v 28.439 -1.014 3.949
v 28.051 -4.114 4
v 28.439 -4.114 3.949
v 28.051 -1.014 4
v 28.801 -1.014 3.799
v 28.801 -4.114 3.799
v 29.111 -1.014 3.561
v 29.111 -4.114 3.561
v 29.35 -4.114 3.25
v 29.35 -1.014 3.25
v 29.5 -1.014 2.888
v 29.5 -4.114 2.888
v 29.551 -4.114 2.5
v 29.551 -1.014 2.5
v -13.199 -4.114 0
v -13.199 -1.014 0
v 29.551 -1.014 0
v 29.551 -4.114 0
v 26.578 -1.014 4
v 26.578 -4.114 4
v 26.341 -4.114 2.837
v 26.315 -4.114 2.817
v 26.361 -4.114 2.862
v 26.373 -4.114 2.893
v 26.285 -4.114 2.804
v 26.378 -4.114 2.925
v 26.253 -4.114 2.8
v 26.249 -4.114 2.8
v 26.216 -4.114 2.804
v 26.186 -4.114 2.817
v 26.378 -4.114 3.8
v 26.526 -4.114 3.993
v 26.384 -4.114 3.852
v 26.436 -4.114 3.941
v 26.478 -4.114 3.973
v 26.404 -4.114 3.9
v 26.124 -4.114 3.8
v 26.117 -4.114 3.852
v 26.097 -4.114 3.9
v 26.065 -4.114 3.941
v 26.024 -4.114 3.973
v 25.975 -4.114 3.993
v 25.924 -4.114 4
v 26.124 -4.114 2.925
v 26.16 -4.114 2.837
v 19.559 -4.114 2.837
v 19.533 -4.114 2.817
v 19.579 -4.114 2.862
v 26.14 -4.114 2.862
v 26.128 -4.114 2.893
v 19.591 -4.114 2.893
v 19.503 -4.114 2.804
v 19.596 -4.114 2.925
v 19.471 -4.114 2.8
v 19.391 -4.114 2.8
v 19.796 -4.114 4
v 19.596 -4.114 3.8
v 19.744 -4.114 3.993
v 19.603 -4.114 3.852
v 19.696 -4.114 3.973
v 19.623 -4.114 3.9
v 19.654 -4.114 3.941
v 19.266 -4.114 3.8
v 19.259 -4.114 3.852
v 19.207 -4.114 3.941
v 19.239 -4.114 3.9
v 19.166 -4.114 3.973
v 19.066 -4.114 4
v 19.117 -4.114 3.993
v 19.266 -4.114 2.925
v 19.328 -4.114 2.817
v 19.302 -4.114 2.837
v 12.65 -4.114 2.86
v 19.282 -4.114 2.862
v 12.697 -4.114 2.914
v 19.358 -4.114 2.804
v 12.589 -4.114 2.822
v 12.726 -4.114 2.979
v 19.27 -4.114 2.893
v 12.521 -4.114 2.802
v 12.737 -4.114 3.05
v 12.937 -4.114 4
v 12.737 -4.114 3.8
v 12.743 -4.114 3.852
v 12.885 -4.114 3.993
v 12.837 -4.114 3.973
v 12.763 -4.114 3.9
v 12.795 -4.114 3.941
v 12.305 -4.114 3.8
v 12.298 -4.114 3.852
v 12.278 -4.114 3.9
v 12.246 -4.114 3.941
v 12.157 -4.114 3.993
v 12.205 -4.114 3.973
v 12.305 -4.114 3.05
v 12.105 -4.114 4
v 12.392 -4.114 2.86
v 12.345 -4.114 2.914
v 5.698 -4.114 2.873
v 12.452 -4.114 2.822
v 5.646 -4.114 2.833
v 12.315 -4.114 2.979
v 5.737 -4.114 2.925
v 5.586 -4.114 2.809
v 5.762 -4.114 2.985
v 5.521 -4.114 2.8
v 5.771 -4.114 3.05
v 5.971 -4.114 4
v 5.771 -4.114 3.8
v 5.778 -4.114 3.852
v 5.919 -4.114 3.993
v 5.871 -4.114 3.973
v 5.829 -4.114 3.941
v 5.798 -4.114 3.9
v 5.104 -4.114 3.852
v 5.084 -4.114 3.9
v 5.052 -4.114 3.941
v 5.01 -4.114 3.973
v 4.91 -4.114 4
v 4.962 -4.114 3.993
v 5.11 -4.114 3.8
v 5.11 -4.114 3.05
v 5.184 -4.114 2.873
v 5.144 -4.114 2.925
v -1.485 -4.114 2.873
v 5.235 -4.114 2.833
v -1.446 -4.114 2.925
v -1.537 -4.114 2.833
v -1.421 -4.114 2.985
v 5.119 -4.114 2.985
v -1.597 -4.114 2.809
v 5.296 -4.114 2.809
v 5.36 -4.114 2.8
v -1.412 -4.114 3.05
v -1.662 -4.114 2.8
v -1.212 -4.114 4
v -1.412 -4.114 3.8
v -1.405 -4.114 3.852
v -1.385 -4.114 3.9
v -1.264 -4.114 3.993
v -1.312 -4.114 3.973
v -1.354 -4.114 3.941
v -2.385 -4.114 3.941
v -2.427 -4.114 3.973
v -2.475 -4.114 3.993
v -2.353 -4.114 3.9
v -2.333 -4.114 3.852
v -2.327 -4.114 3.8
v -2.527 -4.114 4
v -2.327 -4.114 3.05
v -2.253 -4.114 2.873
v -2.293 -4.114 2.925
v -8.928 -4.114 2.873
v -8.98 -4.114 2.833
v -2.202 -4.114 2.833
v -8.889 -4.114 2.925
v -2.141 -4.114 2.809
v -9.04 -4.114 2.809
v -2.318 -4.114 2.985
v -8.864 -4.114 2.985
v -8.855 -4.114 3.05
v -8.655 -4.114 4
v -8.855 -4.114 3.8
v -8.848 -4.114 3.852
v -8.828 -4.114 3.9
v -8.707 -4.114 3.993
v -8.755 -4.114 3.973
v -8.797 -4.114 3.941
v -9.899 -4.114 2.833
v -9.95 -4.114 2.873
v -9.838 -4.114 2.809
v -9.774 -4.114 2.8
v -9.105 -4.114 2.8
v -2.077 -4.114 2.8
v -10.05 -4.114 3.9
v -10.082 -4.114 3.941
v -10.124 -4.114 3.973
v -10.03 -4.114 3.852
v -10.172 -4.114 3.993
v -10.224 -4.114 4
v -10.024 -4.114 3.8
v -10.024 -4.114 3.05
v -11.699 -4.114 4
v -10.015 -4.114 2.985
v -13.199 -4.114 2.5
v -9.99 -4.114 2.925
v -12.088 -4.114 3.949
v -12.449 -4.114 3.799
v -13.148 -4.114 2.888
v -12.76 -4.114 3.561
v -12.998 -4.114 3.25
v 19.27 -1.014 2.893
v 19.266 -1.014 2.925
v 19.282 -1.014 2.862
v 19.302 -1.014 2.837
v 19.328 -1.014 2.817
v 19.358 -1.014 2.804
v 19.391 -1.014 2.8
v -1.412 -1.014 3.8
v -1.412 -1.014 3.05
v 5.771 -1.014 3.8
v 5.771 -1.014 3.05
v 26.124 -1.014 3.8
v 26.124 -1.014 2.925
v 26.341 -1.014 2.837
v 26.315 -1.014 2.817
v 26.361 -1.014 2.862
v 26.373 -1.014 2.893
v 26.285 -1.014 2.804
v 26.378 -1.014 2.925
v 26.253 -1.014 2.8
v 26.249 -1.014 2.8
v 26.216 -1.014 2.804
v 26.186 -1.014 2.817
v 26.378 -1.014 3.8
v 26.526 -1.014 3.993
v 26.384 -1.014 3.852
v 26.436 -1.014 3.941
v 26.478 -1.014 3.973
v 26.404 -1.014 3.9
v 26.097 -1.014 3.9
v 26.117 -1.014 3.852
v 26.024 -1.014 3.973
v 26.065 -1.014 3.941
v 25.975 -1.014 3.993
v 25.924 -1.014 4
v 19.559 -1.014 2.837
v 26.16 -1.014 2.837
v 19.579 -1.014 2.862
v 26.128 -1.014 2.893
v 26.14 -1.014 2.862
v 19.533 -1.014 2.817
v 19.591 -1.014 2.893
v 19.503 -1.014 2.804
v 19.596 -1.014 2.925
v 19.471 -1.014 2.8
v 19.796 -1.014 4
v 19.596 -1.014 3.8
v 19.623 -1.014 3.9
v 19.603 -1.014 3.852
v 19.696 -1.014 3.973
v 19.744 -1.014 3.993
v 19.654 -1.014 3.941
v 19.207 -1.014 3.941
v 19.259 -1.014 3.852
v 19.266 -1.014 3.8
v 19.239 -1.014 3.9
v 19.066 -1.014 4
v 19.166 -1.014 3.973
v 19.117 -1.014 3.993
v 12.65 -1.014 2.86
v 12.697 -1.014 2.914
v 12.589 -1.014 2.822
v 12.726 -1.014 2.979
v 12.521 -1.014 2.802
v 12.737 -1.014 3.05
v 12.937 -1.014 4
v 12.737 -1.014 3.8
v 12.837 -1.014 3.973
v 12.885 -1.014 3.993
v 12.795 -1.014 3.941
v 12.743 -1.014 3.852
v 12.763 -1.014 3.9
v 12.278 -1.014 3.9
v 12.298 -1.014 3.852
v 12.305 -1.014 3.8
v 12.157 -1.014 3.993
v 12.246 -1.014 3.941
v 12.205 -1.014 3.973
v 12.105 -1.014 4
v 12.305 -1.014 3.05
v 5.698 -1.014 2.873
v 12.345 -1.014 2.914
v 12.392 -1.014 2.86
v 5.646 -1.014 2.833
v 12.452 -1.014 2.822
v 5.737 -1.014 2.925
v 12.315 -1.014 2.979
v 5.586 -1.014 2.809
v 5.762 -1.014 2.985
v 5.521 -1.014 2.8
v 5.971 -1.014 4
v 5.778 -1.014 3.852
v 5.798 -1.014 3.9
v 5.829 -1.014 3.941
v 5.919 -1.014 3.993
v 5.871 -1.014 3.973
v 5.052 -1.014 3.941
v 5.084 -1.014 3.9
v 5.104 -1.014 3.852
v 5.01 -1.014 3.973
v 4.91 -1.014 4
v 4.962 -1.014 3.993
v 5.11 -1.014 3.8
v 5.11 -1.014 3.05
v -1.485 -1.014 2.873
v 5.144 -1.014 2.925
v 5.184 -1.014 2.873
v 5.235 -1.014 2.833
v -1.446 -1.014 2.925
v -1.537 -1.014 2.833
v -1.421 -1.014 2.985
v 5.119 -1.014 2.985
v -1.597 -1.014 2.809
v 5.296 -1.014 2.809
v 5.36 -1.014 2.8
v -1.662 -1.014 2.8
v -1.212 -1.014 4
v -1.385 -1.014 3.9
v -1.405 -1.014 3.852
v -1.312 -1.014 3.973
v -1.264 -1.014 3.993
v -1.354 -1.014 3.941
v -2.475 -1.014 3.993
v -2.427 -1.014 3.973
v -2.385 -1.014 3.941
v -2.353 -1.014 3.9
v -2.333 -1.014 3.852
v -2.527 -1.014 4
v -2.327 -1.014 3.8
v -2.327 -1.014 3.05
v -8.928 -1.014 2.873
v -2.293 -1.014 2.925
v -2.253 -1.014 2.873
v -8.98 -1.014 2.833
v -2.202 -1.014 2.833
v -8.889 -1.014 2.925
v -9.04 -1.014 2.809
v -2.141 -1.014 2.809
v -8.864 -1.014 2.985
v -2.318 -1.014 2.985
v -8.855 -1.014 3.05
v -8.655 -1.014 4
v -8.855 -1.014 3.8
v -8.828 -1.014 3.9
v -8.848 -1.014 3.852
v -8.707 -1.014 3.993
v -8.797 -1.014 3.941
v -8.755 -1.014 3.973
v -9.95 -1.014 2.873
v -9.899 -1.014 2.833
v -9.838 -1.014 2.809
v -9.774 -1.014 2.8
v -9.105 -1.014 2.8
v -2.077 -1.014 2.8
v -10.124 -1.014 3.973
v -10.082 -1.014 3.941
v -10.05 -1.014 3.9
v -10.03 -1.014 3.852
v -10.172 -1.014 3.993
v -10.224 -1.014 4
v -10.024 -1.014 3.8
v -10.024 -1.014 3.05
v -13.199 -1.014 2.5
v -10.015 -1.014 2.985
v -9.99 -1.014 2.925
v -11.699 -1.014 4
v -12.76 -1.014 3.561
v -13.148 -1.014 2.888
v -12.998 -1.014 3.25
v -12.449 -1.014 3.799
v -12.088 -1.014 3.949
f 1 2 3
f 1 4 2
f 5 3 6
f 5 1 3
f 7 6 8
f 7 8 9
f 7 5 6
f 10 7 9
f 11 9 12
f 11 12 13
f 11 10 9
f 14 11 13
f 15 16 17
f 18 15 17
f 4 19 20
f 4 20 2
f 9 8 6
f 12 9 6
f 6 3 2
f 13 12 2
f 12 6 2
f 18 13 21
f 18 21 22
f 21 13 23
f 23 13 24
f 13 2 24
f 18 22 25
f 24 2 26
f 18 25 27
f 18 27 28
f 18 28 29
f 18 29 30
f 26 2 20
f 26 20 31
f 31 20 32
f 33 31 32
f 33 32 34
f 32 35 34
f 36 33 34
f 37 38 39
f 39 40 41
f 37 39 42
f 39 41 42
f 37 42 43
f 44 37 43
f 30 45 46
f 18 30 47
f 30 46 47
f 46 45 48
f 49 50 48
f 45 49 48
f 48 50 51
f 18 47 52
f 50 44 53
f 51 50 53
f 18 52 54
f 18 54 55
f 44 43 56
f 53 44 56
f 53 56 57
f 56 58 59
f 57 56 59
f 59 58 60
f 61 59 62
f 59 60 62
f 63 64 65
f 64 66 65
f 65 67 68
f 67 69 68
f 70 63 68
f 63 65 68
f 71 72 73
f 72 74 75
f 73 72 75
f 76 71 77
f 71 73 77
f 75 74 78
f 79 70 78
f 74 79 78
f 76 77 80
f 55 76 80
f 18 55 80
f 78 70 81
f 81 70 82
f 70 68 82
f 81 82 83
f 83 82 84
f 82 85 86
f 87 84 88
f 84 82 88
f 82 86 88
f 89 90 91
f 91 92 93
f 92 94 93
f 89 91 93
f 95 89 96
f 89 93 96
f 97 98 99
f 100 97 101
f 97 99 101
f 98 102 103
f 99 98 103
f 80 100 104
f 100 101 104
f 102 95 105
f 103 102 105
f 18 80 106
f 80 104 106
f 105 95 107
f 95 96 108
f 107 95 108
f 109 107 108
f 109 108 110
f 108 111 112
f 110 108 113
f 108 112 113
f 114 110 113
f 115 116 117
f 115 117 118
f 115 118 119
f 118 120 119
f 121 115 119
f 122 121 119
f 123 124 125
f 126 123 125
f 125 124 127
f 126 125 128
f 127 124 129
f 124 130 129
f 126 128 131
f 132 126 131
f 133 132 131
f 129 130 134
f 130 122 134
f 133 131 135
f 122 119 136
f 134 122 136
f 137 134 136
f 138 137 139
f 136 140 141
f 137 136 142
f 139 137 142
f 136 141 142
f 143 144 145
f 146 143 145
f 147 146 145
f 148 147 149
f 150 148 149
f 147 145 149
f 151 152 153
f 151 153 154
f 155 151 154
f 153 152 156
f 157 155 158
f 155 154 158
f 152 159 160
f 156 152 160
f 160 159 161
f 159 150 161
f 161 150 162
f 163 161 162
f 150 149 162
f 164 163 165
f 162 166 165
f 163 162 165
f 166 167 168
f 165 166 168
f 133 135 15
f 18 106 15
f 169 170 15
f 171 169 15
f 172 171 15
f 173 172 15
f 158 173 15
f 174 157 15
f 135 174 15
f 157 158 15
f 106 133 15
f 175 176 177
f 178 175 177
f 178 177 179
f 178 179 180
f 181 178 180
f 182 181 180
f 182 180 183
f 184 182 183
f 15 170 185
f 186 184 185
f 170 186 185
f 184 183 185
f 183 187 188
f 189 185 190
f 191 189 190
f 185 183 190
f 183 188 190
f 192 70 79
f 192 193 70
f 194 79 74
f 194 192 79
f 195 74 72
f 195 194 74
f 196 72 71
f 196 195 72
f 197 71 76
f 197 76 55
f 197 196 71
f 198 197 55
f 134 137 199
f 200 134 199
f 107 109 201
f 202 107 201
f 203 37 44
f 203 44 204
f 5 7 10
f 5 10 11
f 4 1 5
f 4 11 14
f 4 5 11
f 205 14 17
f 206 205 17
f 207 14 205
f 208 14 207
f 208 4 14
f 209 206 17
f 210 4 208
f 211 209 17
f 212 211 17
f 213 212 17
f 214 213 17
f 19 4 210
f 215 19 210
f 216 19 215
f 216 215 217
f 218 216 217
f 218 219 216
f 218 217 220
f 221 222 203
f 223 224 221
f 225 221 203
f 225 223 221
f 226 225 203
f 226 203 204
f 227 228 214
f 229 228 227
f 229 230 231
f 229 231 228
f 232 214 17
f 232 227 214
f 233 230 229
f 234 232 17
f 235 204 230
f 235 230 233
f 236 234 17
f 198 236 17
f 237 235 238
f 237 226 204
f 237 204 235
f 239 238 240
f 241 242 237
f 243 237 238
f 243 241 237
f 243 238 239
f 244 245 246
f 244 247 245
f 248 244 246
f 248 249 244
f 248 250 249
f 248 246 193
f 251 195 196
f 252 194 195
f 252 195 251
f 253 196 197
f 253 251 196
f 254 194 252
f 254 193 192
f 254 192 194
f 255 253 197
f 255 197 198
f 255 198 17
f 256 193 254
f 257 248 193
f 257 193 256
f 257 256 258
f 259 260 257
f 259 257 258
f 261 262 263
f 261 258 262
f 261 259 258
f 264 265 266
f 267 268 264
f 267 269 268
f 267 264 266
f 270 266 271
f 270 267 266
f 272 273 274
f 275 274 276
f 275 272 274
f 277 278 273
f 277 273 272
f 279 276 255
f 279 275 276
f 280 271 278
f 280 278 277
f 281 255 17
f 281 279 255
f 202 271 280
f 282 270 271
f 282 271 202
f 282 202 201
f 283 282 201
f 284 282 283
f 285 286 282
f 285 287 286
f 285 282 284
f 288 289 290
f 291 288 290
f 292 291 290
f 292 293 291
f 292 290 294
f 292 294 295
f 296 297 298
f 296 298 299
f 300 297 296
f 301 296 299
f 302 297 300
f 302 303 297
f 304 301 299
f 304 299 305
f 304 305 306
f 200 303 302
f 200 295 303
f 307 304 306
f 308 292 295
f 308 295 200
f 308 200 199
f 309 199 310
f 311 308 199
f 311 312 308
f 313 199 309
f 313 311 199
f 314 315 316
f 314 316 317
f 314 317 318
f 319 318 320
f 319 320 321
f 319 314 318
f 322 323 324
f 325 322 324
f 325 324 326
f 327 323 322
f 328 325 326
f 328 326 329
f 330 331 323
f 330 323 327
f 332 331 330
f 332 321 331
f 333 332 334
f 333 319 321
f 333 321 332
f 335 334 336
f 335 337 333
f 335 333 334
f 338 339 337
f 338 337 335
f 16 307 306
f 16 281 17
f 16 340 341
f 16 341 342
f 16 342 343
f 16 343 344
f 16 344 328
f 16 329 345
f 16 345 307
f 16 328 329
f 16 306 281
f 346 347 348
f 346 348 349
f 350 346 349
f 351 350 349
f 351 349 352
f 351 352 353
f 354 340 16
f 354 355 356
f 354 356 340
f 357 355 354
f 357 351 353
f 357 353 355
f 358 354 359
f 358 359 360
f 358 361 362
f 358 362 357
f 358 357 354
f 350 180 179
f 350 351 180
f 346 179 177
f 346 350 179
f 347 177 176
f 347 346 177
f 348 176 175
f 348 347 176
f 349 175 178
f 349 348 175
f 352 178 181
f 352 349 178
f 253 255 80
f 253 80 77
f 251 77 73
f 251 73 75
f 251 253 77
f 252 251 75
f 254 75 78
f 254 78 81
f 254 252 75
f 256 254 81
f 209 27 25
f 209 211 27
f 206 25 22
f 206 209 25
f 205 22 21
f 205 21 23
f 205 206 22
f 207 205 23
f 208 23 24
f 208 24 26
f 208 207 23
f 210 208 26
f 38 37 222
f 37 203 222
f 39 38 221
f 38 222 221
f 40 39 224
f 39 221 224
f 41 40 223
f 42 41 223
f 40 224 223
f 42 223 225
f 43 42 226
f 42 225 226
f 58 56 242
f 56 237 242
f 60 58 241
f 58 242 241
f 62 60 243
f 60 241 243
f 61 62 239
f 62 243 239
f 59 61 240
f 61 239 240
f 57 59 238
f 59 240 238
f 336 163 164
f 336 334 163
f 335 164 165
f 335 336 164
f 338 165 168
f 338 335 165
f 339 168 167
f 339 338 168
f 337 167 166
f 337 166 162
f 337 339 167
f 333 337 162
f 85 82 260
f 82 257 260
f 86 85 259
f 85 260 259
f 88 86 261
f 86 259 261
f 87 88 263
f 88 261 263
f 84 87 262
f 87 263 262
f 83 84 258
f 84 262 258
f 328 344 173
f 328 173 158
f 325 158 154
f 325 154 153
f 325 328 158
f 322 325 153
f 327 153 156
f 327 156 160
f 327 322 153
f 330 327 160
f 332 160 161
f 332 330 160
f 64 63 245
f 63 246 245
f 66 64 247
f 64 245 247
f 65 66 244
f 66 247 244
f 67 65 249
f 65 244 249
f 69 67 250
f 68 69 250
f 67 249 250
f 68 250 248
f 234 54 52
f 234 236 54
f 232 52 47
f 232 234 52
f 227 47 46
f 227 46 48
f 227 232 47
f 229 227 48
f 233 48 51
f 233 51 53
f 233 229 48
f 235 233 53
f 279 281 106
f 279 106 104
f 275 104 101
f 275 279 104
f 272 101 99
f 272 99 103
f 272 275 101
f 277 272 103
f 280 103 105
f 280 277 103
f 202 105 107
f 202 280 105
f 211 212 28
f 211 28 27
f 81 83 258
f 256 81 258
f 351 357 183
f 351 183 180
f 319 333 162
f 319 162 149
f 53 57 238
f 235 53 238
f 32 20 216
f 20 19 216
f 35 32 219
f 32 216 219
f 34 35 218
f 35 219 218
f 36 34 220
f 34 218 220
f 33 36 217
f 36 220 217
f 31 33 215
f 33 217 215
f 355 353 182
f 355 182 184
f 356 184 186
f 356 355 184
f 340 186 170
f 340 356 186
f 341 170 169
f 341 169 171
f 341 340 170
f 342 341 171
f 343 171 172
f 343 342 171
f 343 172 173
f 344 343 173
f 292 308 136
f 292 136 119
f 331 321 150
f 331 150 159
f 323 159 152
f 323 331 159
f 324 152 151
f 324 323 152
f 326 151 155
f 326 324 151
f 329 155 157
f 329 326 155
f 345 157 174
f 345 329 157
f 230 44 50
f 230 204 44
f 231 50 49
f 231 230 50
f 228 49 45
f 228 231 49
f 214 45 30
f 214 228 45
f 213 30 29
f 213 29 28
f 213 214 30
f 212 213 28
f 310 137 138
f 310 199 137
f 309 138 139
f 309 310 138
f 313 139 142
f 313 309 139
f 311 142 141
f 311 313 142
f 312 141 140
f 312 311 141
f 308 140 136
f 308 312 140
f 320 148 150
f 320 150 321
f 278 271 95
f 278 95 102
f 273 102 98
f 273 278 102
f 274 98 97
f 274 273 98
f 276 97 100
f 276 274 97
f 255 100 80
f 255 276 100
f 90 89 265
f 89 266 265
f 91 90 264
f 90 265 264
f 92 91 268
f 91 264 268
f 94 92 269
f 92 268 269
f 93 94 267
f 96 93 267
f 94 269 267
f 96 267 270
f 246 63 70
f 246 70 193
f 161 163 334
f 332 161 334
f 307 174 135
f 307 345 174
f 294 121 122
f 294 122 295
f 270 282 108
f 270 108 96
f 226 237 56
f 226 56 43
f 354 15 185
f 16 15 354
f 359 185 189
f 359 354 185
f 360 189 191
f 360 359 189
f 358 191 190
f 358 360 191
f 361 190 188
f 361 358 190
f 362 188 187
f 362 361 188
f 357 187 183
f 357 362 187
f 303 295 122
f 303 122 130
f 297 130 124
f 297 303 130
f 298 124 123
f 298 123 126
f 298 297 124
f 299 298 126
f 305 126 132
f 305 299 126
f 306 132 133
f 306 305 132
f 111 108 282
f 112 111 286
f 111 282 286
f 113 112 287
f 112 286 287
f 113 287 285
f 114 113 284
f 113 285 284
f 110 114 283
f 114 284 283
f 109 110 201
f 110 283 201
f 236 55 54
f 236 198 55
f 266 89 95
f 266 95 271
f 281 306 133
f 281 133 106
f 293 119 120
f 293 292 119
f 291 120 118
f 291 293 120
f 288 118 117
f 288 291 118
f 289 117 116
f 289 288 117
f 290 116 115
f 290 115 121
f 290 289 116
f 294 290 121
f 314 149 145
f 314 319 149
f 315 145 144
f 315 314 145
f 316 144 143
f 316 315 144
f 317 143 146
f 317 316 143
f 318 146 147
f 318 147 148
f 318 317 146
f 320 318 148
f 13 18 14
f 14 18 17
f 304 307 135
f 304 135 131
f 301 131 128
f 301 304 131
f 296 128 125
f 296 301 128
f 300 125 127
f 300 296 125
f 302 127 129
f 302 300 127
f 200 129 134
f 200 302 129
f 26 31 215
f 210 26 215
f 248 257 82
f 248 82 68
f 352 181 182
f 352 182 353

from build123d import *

# Parameters (mm, degrees)
F0_W        = 3.1758
F0_H        = 3.1
F0_W_2      = 1.1684
F0_W_3      = 6.5286
F0_W_4      = 0.9144
F0_W_5      = 6.5226
F0_W_6      = 0.6604
F0_W_7      = 6.5339
F0_W_8      = 0.4318
F0_W_9      = 6.529
F0_W_10     = 0.3302
F0_W_11     = 6.5279
F0_W_12     = 0.254
F0_W_13     = 3.173
F1_DEPTH    = 4
F2_W        = 0.5842
F2_H        = 3.1
F2_W_2      = 0.4572
F2_W_3      = 0.3302
F2_W_4      = 0.2159
F2_W_5      = 0.1651
F2_W_6      = 0.127
F3_DEPTH    = 1.2
F4_T1_DEPTH = 3.1
F5_R        = 0.125
F6_R        = 1.5
F7_R        = 0.2


# Not quite as in the source:
# - a fillet or chamfer that OpenCascade refuses, or shapes differently, is made with other operations: its cross-section is extruded or revolved along the edge and cut away or added


with BuildPart() as f1:
    # F0 (on Top) → F1 (new body)
    with BuildSketch(Plane.XY):
        with Locations((-11.6114438434, -2.5640697926)):
            Rectangle(F0_W, F0_H)
        with Locations((-9.4393438434, -2.5640697926)):
            Rectangle(F0_W_2, F0_H)
        with Locations((-5.5908438434, -2.5640697926)):
            Rectangle(F0_W_3, F0_H)
        with Locations((-1.8693438434, -2.5640697926)):
            Rectangle(F0_W_4, F0_H)
        with Locations((1.8491561566, -2.5640697926)):
            Rectangle(F0_W_5, F0_H)
        with Locations((5.4406561566, -2.5640697926)):
            Rectangle(F0_W_6, F0_H)
        with Locations((9.0378061566, -2.5640697926)):
            Rectangle(F0_W_7, F0_H)
        with Locations((12.5206561566, -2.5640697926)):
            Rectangle(F0_W_8, F0_H)
        with Locations((16.0010561566, -2.5640697926)):
            Rectangle(F0_W_9, F0_H)
        with Locations((19.4306561566, -2.5640697926)):
            Rectangle(F0_W_10, F0_H)
        with Locations((22.8597061566, -2.5640697926)):
            Rectangle(F0_W_11, F0_H)
        with Locations((26.2506561566, -2.5640697926)):
            Rectangle(F0_W_12, F0_H)
        with Locations((27.9641561566, -2.5640697926)):
            Rectangle(F0_W_13, F0_H)
    extrude(amount=F1_DEPTH)

    # F2 (on face) → F3 (cut)
    with BuildSketch(Plane.XY.offset(4)):
        with Locations((-9.1472438434, -2.5640697926)):
            Rectangle(F2_W, F2_H)
        with Locations((-9.7314438434, -2.5640697926)):
            Rectangle(F2_W, F2_H)
        with Locations((-1.6407438434, -2.5640697926)):
            Rectangle(F2_W_2, F2_H)
        with Locations((-2.0979438434, -2.5640697926)):
            Rectangle(F2_W_2, F2_H)
        with Locations((5.2755561566, -2.5640697926)):
            Rectangle(F2_W_3, F2_H)
        with Locations((5.6057561566, -2.5640697926)):
            Rectangle(F2_W_3, F2_H)
        with Locations((12.4127061566, -2.5640697926)):
            Rectangle(F2_W_4, F2_H)
        with Locations((12.6286061566, -2.5640697926)):
            Rectangle(F2_W_4, F2_H)
        with Locations((19.3481061566, -2.5640697926)):
            Rectangle(F2_W_5, F2_H)
        with Locations((19.5132061566, -2.5640697926)):
            Rectangle(F2_W_5, F2_H)
        with Locations((26.3141561566, -2.5640697926)):
            Rectangle(F2_W_6, F2_H)
        with Locations((26.1871561566, -2.5640697926)):
            Rectangle(F2_W_6, F2_H)
    extrude(amount=-F3_DEPTH, mode=Mode.SUBTRACT)

    # F4: fillet of radius 0.25 on 8 edges, made by hand

    # F4_s2 → F4_t1 (join)
    with BuildSketch(Plane.XZ.offset(1.0140697926)):
        with BuildLine():
            ThreePointArc((-10.0235438434, 3.05), (-9.9503205387, 2.8732233047), (-9.7735438434, 2.8))
            Line((-9.7735438434, 2.8), (-10.0235438434, 2.8))
            Line((-10.0235438434, 2.8), (-10.0235438434, 3.05))
        make_face()
        with BuildLine():
            ThreePointArc((-9.1051438434, 2.8), (-8.9283671481, 2.8732233047), (-8.8551438434, 3.05))
            Line((-8.8551438434, 3.05), (-8.8551438434, 2.8))
            Line((-8.8551438434, 2.8), (-9.1051438434, 2.8))
        make_face()
        with BuildLine():
            ThreePointArc((-1.6621438434, 2.8), (-1.4853671481, 2.8732233047), (-1.4121438434, 3.05))
            Line((-1.4121438434, 3.05), (-1.4121438434, 2.8))
            Line((-1.4121438434, 2.8), (-1.6621438434, 2.8))
        make_face()
        with BuildLine():
            ThreePointArc((-2.3265438434, 3.05), (-2.2533205387, 2.8732233047), (-2.0765438434, 2.8))
            Line((-2.0765438434, 2.8), (-2.3265438434, 2.8))
            Line((-2.3265438434, 2.8), (-2.3265438434, 3.05))
        make_face()
        with BuildLine():
            ThreePointArc((5.1104561566, 3.05), (5.1836794613, 2.8732233047), (5.3604561566, 2.8))
            Line((5.3604561566, 2.8), (5.1104561566, 2.8))
            Line((5.1104561566, 2.8), (5.1104561566, 3.05))
        make_face()
        with BuildLine():
            ThreePointArc((5.5208561566, 2.8), (5.6976328519, 2.8732233047), (5.7708561566, 3.05))
            Line((5.7708561566, 3.05), (5.7708561566, 2.8))
            Line((5.7708561566, 2.8), (5.5208561566, 2.8))
        make_face()
        with BuildLine():
            ThreePointArc((12.4865561566, 2.8), (12.6633328519, 2.8732233047), (12.7365561566, 3.05))
            Line((12.7365561566, 3.05), (12.7365561566, 2.8))
            Line((12.7365561566, 2.8), (12.4865561566, 2.8))
        make_face()
        with BuildLine():
            ThreePointArc((12.3047561566, 3.05), (12.3779794613, 2.8732233047), (12.5547561566, 2.8))
            Line((12.5547561566, 2.8), (12.3047561566, 2.8))
            Line((12.3047561566, 2.8), (12.3047561566, 3.05))
        make_face()
    extrude(amount=F4_T1_DEPTH)

    # F5
    f5_edges = [f1.edges().sort_by_distance(p)[0] for p in [
        (19.265556, -2.56407, 2.8),
        (19.595756, -2.56407, 2.8),
        (26.377656, -2.56407, 2.8),
        (26.123656, -2.56407, 2.8),
    ]]
    fillet(f5_edges, radius=F5_R)

    # F6
    f6_edges = [f1.edges().sort_by_distance(p)[0] for p in [
        (29.550656, -2.56407, 4),
        (-13.199344, -2.56407, 4),
    ]]
    fillet(f6_edges, radius=F6_R)

    # F7
    f7_edges = [f1.edges().sort_by_distance(p)[0] for p in [
        (-10.023544, -2.56407, 4),
        (-8.855144, -2.56407, 4),
        (-2.326544, -2.56407, 4),
        (-1.412144, -2.56407, 4),
        (5.110456, -2.56407, 4),
        (5.770856, -2.56407, 4),
        (12.304756, -2.56407, 4),
        (12.736556, -2.56407, 4),
        (19.265556, -2.56407, 4),
        (19.595756, -2.56407, 4),
        (26.123656, -2.56407, 4),
        (26.377656, -2.56407, 4),
    ]]
    fillet(f7_edges, radius=F7_R)


solid = f1.part
